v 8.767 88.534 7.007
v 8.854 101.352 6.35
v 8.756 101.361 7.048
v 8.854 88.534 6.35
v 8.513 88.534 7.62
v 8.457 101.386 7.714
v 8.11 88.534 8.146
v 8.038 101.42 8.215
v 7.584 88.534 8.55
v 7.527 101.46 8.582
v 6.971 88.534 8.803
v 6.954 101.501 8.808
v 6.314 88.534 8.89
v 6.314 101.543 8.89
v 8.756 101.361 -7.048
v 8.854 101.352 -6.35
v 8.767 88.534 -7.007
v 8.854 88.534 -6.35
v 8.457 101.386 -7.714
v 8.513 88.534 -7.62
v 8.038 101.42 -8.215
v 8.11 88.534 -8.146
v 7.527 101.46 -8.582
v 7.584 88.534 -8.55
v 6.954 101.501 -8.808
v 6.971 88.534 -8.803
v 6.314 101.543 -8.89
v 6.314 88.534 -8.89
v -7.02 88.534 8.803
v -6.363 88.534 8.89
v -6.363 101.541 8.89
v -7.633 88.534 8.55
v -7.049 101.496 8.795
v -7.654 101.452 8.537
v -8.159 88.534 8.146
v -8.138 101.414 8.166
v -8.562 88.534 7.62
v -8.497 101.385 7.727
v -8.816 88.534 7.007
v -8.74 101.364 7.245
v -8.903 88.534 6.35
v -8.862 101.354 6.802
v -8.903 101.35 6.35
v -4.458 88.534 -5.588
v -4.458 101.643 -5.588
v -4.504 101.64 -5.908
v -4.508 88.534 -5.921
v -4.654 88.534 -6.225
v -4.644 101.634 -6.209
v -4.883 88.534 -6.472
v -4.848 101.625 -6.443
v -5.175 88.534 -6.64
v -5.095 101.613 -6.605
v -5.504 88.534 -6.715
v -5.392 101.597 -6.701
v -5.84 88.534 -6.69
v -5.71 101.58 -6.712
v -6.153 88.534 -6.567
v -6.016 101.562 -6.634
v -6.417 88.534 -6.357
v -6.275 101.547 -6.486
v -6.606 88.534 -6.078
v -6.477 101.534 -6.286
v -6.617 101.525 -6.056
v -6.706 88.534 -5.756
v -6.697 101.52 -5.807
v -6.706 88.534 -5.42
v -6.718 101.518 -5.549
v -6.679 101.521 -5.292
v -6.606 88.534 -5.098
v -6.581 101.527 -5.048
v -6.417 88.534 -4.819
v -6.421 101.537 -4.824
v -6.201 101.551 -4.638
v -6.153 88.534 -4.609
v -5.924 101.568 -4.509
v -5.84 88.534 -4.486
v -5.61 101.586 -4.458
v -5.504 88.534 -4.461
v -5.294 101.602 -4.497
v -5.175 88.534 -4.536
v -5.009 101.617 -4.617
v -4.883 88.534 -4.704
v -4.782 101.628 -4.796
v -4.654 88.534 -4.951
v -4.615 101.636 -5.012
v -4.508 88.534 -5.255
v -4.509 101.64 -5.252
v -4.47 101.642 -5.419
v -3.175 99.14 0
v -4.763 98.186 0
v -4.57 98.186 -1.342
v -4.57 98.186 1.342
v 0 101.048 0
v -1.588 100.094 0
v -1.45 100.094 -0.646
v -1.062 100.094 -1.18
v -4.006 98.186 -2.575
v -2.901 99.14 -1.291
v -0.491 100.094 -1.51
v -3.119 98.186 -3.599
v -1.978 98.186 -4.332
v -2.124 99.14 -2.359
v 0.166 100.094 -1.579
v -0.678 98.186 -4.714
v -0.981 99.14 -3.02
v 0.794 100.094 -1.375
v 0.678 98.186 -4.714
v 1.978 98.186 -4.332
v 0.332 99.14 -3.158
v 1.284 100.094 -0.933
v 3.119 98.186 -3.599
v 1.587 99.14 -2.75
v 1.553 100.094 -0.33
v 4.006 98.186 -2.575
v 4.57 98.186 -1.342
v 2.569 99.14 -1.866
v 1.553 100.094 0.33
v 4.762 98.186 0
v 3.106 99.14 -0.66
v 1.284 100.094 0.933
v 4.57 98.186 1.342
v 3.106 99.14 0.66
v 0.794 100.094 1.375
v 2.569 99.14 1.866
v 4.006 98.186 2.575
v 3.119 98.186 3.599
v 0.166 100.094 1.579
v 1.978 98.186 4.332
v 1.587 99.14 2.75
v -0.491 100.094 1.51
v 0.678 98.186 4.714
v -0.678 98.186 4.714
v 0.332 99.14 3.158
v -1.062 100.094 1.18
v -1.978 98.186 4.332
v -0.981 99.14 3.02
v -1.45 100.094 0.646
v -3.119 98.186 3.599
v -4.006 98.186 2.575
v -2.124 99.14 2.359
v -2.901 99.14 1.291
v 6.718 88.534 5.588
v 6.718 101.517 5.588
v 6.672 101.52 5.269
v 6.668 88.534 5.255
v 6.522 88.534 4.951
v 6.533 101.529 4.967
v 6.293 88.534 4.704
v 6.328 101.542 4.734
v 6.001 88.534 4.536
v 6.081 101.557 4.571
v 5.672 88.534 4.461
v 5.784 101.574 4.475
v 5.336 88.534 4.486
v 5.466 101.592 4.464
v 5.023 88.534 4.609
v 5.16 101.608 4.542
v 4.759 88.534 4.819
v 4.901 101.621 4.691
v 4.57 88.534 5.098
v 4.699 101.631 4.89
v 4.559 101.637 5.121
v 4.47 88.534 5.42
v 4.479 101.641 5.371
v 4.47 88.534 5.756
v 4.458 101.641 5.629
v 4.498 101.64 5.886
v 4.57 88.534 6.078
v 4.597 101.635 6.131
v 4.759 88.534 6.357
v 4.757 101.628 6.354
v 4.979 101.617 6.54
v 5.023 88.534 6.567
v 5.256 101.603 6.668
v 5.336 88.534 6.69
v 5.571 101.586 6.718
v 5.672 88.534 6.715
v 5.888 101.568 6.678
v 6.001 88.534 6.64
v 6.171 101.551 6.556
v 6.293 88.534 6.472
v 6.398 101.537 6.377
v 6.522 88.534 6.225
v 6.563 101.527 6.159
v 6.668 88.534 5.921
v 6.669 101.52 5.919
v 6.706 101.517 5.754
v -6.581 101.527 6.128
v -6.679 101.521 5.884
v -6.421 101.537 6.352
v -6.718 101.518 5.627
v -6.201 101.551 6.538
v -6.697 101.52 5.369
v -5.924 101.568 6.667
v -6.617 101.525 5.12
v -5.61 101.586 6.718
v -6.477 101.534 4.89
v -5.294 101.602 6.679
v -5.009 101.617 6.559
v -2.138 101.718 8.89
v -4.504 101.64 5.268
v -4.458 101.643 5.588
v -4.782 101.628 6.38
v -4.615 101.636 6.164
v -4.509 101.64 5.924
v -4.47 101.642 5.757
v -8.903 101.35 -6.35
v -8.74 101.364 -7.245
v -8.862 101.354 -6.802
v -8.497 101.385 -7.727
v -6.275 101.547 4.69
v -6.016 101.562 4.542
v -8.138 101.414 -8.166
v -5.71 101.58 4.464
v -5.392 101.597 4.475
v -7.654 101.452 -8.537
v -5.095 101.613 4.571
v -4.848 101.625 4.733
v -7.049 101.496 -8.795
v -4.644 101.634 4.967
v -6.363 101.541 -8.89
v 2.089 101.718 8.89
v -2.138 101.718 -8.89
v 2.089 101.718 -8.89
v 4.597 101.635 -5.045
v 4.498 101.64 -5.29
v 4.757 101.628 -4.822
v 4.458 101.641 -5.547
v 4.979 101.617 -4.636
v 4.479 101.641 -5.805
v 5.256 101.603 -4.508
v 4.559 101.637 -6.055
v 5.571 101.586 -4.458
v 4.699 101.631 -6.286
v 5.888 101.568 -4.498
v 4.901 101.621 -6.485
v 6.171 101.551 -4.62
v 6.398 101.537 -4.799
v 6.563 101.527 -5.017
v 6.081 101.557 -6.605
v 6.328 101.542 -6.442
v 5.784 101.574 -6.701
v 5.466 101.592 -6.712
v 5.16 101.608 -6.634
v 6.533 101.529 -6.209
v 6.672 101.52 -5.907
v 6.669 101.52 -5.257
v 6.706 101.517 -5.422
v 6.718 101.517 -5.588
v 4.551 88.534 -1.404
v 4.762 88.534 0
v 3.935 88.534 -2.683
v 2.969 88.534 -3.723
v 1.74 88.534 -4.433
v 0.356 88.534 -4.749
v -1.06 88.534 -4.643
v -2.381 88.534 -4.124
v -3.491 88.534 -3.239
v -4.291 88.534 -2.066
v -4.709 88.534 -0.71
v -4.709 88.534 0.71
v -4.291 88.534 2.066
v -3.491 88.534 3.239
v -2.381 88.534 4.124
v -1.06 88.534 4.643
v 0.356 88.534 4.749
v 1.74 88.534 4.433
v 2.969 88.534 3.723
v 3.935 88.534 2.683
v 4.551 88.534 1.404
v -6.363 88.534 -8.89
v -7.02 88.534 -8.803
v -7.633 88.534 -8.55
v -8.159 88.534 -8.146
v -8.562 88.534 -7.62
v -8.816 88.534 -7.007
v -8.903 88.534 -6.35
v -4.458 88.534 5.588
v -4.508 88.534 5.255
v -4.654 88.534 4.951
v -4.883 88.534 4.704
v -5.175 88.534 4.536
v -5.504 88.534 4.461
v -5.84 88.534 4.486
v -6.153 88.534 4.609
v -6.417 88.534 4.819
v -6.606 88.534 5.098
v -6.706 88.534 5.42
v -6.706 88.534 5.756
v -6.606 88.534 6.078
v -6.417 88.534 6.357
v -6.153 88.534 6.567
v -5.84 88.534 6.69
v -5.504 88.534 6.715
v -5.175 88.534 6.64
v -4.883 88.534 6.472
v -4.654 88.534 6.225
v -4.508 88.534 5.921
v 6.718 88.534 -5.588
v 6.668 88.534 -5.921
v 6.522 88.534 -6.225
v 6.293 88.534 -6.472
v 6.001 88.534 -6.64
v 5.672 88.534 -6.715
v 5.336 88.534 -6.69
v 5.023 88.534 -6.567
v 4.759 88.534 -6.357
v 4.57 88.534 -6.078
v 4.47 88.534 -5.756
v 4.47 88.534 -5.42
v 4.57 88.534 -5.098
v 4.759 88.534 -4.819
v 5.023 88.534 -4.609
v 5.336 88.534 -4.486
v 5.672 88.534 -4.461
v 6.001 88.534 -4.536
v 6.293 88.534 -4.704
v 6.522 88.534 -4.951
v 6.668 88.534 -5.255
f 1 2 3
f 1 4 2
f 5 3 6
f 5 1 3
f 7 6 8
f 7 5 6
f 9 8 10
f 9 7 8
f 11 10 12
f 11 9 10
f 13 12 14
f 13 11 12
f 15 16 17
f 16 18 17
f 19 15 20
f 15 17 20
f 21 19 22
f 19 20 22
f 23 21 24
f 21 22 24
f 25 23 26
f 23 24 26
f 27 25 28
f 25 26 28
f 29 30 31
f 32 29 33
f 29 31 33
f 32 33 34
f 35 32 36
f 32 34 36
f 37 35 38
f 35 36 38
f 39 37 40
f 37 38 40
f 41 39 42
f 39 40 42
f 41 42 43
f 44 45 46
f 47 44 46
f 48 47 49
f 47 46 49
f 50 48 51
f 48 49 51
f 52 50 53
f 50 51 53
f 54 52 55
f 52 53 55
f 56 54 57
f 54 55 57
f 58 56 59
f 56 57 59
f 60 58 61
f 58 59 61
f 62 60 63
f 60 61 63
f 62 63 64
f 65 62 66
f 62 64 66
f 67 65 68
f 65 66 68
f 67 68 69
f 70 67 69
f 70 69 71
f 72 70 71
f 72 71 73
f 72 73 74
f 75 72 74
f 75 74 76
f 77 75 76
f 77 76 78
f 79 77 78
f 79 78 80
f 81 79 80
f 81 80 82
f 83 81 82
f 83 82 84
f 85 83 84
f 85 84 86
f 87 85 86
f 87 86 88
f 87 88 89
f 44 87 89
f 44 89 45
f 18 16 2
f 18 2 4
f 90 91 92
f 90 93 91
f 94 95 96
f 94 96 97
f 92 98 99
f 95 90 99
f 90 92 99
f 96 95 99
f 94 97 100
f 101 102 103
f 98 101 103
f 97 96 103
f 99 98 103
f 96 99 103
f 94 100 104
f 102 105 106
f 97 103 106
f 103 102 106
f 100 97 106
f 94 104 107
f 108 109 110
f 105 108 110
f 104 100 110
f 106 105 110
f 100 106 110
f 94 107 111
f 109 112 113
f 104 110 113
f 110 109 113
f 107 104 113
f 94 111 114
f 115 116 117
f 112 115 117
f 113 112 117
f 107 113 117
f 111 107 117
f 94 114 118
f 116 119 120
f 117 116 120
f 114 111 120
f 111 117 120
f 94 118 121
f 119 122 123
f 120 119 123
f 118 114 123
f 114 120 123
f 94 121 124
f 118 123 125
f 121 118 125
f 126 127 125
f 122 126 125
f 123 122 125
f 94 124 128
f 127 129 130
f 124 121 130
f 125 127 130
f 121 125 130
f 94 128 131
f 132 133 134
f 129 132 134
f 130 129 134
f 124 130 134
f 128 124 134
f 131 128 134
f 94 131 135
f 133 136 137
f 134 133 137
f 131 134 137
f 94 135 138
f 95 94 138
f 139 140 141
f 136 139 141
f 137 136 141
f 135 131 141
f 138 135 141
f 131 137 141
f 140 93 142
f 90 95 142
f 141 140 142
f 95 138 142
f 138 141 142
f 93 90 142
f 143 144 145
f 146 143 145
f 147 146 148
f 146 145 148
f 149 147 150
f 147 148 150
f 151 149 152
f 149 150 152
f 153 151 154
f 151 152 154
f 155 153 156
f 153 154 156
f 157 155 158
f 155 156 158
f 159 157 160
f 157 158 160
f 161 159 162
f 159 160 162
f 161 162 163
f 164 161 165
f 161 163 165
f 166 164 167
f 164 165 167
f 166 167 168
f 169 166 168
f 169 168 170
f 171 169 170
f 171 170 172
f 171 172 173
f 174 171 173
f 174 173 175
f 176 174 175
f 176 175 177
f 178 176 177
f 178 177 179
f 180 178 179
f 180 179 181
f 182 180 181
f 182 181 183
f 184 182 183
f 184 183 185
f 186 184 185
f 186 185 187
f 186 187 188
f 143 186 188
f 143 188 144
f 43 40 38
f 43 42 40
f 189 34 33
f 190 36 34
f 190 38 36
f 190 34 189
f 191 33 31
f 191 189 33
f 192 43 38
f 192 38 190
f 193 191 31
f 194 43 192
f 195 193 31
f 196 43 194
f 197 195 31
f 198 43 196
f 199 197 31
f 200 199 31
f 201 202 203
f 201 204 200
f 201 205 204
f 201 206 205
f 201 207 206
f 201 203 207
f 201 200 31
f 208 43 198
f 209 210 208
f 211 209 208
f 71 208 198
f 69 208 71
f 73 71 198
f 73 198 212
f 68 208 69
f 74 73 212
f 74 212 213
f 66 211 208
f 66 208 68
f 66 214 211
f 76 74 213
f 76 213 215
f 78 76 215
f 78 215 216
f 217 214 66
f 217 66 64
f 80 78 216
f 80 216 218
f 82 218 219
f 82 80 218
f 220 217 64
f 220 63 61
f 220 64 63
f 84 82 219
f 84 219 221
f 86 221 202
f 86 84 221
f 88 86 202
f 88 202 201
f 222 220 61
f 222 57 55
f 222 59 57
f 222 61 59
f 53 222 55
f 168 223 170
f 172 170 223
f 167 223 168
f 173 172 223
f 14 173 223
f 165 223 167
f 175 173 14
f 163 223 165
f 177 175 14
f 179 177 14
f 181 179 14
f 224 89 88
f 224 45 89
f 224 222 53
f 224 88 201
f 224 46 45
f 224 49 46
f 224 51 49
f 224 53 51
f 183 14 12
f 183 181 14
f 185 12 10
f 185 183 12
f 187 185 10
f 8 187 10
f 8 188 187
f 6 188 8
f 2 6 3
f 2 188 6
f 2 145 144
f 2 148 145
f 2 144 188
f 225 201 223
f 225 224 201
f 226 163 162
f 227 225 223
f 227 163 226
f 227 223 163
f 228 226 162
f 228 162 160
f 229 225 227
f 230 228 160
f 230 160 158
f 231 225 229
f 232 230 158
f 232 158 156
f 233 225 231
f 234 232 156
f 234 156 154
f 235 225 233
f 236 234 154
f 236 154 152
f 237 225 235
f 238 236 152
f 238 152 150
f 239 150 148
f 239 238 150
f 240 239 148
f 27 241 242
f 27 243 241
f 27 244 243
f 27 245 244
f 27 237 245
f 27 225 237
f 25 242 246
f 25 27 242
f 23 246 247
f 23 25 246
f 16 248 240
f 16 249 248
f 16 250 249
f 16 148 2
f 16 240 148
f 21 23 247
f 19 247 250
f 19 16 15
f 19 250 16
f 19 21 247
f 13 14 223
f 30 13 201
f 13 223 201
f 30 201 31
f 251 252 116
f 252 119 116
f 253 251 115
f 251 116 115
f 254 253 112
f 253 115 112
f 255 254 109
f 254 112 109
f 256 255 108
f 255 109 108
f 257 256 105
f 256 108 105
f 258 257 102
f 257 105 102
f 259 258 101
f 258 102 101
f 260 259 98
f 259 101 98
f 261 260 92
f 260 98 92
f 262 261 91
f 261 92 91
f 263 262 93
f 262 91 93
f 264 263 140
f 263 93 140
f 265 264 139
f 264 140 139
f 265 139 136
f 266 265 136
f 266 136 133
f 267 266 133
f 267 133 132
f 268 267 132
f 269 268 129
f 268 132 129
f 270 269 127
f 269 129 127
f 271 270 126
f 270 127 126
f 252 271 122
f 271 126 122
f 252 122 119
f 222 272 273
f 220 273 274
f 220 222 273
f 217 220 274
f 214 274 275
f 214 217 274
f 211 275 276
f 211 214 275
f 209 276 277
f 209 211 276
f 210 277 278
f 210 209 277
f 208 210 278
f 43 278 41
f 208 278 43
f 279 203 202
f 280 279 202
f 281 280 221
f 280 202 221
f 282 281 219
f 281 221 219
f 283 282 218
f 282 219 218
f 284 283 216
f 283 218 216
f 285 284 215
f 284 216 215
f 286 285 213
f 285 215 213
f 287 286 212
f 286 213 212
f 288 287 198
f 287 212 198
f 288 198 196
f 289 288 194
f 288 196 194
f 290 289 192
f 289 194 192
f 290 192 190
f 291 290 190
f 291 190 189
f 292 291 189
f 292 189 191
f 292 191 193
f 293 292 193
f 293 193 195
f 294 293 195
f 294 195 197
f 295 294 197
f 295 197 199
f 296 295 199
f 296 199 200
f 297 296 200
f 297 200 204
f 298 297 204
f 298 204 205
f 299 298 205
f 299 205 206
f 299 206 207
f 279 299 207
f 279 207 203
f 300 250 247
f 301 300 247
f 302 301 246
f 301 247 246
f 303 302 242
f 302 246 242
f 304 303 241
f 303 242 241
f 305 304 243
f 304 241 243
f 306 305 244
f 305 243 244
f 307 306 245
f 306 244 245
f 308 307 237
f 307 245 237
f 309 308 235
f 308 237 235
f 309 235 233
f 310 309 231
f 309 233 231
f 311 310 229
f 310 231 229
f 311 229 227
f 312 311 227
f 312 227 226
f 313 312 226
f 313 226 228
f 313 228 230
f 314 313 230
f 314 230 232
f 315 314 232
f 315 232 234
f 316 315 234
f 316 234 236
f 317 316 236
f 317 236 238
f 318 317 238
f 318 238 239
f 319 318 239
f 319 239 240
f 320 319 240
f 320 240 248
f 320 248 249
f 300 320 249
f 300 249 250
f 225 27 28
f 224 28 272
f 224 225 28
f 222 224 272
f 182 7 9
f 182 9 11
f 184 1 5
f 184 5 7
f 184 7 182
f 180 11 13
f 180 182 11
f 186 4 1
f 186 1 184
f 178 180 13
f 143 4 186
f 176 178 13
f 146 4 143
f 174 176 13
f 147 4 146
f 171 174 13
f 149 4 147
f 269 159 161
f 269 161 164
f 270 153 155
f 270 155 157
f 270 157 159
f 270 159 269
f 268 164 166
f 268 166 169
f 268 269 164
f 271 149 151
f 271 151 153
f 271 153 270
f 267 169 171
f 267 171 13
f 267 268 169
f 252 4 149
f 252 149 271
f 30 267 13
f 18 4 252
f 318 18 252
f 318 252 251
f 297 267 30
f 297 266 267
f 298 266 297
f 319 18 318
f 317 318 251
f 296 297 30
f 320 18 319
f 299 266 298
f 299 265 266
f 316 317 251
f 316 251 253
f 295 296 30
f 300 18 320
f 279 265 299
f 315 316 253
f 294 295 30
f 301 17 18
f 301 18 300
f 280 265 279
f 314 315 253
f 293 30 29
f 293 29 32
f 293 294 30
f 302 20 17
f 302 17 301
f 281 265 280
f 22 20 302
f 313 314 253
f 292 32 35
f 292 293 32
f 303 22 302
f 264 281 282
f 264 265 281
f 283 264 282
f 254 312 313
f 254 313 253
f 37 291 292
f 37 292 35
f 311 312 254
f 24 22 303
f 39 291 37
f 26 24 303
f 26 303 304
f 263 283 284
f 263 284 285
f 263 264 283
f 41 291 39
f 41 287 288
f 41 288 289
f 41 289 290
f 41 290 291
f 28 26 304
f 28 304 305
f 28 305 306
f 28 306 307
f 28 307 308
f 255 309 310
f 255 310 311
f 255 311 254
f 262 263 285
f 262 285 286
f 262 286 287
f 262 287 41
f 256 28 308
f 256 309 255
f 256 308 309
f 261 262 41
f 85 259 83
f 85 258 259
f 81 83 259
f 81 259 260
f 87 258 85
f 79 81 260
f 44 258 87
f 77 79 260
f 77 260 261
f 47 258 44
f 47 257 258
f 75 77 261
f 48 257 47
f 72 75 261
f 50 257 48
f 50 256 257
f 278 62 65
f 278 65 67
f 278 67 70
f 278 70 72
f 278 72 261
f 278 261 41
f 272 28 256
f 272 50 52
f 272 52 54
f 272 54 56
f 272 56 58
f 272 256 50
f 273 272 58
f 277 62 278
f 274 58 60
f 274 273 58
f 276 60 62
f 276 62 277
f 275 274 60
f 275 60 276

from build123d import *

# Parameters (mm, degrees)
BOSS_EXTRUDE1_DEPTH              = 8.89
BOSS_EXTRUDE1_DEPTH_BACK         = 8.89
F_3_8_0_375_DIAMETER_SLOT1_D     = 9.525
F_3_8_0_375_DIAMETER_SLOT1_DEPTH = 9.652
F_3_8_0_375_DIAMETER_SLOT1_TIP   = 2.861598698
TAP_DRILL_FOR_4_40_TAP1_D        = 2.2606
FILLET1_R                        = 2.54


with BuildPart() as part:
    # Sketch1 → Boss-Extrude1 (new, two sides: drawn at the far end of the back side and taken through both)
    with BuildSketch(Plane.XY.offset(-BOSS_EXTRUDE1_DEPTH_BACK)):
        with BuildLine():
            Line((8.853671113, 101.352246104), (8.853671113, 88.534433979))
            Line((8.853671113, 88.534433979), (-8.902635044, 88.534433979))
            Line((-8.902635044, 88.534433979), (-8.902635044, 101.350105765))
            ThreePointArc((-8.902635044, 101.350105765), (-0.024528813, 101.739820854), (8.853671113, 101.352246104))
        make_face()
    extrude(amount=BOSS_EXTRUDE1_DEPTH + BOSS_EXTRUDE1_DEPTH_BACK)

    # 3/8 (0.375) Diameter Slot1
    with Locations(Plane(origin=(0, 88.534433979, 0), x_dir=(-1, 0, 0), z_dir=(0, -1, 0))):
        with Locations((0, 0)):
            Hole(F_3_8_0_375_DIAMETER_SLOT1_D / 2, depth=F_3_8_0_375_DIAMETER_SLOT1_DEPTH)
            with Locations((0, 0, -(F_3_8_0_375_DIAMETER_SLOT1_DEPTH + F_3_8_0_375_DIAMETER_SLOT1_TIP / 2))):  # 118° drill point
                Cone(0, F_3_8_0_375_DIAMETER_SLOT1_D / 2, F_3_8_0_375_DIAMETER_SLOT1_TIP, mode=Mode.SUBTRACT)

    # Tap Drill for #4-40 Tap1 (through all)
    with Locations(Plane(origin=(0, 88.534433979, 0), x_dir=(-1, 0, 0), z_dir=(0, -1, 0))):
        with Locations((-5.588, 5.588), (5.588, 5.588), (5.588, -5.588), (-5.588, -5.588)):
            Hole(TAP_DRILL_FOR_4_40_TAP1_D / 2)

    # Fillet1
    fillet1_edges = [part.edges().sort_by_distance(p)[0] for p in [
        (-8.902635044, 94.942269872, 8.89),
        (8.853671113, 94.943340042, -8.89),
        (8.853671113, 94.943340042, 8.89),
        (-8.902635044, 94.942269872, -8.89),
    ]]
    fillet(fillet1_edges, radius=FILLET1_R)


solid = part.part
